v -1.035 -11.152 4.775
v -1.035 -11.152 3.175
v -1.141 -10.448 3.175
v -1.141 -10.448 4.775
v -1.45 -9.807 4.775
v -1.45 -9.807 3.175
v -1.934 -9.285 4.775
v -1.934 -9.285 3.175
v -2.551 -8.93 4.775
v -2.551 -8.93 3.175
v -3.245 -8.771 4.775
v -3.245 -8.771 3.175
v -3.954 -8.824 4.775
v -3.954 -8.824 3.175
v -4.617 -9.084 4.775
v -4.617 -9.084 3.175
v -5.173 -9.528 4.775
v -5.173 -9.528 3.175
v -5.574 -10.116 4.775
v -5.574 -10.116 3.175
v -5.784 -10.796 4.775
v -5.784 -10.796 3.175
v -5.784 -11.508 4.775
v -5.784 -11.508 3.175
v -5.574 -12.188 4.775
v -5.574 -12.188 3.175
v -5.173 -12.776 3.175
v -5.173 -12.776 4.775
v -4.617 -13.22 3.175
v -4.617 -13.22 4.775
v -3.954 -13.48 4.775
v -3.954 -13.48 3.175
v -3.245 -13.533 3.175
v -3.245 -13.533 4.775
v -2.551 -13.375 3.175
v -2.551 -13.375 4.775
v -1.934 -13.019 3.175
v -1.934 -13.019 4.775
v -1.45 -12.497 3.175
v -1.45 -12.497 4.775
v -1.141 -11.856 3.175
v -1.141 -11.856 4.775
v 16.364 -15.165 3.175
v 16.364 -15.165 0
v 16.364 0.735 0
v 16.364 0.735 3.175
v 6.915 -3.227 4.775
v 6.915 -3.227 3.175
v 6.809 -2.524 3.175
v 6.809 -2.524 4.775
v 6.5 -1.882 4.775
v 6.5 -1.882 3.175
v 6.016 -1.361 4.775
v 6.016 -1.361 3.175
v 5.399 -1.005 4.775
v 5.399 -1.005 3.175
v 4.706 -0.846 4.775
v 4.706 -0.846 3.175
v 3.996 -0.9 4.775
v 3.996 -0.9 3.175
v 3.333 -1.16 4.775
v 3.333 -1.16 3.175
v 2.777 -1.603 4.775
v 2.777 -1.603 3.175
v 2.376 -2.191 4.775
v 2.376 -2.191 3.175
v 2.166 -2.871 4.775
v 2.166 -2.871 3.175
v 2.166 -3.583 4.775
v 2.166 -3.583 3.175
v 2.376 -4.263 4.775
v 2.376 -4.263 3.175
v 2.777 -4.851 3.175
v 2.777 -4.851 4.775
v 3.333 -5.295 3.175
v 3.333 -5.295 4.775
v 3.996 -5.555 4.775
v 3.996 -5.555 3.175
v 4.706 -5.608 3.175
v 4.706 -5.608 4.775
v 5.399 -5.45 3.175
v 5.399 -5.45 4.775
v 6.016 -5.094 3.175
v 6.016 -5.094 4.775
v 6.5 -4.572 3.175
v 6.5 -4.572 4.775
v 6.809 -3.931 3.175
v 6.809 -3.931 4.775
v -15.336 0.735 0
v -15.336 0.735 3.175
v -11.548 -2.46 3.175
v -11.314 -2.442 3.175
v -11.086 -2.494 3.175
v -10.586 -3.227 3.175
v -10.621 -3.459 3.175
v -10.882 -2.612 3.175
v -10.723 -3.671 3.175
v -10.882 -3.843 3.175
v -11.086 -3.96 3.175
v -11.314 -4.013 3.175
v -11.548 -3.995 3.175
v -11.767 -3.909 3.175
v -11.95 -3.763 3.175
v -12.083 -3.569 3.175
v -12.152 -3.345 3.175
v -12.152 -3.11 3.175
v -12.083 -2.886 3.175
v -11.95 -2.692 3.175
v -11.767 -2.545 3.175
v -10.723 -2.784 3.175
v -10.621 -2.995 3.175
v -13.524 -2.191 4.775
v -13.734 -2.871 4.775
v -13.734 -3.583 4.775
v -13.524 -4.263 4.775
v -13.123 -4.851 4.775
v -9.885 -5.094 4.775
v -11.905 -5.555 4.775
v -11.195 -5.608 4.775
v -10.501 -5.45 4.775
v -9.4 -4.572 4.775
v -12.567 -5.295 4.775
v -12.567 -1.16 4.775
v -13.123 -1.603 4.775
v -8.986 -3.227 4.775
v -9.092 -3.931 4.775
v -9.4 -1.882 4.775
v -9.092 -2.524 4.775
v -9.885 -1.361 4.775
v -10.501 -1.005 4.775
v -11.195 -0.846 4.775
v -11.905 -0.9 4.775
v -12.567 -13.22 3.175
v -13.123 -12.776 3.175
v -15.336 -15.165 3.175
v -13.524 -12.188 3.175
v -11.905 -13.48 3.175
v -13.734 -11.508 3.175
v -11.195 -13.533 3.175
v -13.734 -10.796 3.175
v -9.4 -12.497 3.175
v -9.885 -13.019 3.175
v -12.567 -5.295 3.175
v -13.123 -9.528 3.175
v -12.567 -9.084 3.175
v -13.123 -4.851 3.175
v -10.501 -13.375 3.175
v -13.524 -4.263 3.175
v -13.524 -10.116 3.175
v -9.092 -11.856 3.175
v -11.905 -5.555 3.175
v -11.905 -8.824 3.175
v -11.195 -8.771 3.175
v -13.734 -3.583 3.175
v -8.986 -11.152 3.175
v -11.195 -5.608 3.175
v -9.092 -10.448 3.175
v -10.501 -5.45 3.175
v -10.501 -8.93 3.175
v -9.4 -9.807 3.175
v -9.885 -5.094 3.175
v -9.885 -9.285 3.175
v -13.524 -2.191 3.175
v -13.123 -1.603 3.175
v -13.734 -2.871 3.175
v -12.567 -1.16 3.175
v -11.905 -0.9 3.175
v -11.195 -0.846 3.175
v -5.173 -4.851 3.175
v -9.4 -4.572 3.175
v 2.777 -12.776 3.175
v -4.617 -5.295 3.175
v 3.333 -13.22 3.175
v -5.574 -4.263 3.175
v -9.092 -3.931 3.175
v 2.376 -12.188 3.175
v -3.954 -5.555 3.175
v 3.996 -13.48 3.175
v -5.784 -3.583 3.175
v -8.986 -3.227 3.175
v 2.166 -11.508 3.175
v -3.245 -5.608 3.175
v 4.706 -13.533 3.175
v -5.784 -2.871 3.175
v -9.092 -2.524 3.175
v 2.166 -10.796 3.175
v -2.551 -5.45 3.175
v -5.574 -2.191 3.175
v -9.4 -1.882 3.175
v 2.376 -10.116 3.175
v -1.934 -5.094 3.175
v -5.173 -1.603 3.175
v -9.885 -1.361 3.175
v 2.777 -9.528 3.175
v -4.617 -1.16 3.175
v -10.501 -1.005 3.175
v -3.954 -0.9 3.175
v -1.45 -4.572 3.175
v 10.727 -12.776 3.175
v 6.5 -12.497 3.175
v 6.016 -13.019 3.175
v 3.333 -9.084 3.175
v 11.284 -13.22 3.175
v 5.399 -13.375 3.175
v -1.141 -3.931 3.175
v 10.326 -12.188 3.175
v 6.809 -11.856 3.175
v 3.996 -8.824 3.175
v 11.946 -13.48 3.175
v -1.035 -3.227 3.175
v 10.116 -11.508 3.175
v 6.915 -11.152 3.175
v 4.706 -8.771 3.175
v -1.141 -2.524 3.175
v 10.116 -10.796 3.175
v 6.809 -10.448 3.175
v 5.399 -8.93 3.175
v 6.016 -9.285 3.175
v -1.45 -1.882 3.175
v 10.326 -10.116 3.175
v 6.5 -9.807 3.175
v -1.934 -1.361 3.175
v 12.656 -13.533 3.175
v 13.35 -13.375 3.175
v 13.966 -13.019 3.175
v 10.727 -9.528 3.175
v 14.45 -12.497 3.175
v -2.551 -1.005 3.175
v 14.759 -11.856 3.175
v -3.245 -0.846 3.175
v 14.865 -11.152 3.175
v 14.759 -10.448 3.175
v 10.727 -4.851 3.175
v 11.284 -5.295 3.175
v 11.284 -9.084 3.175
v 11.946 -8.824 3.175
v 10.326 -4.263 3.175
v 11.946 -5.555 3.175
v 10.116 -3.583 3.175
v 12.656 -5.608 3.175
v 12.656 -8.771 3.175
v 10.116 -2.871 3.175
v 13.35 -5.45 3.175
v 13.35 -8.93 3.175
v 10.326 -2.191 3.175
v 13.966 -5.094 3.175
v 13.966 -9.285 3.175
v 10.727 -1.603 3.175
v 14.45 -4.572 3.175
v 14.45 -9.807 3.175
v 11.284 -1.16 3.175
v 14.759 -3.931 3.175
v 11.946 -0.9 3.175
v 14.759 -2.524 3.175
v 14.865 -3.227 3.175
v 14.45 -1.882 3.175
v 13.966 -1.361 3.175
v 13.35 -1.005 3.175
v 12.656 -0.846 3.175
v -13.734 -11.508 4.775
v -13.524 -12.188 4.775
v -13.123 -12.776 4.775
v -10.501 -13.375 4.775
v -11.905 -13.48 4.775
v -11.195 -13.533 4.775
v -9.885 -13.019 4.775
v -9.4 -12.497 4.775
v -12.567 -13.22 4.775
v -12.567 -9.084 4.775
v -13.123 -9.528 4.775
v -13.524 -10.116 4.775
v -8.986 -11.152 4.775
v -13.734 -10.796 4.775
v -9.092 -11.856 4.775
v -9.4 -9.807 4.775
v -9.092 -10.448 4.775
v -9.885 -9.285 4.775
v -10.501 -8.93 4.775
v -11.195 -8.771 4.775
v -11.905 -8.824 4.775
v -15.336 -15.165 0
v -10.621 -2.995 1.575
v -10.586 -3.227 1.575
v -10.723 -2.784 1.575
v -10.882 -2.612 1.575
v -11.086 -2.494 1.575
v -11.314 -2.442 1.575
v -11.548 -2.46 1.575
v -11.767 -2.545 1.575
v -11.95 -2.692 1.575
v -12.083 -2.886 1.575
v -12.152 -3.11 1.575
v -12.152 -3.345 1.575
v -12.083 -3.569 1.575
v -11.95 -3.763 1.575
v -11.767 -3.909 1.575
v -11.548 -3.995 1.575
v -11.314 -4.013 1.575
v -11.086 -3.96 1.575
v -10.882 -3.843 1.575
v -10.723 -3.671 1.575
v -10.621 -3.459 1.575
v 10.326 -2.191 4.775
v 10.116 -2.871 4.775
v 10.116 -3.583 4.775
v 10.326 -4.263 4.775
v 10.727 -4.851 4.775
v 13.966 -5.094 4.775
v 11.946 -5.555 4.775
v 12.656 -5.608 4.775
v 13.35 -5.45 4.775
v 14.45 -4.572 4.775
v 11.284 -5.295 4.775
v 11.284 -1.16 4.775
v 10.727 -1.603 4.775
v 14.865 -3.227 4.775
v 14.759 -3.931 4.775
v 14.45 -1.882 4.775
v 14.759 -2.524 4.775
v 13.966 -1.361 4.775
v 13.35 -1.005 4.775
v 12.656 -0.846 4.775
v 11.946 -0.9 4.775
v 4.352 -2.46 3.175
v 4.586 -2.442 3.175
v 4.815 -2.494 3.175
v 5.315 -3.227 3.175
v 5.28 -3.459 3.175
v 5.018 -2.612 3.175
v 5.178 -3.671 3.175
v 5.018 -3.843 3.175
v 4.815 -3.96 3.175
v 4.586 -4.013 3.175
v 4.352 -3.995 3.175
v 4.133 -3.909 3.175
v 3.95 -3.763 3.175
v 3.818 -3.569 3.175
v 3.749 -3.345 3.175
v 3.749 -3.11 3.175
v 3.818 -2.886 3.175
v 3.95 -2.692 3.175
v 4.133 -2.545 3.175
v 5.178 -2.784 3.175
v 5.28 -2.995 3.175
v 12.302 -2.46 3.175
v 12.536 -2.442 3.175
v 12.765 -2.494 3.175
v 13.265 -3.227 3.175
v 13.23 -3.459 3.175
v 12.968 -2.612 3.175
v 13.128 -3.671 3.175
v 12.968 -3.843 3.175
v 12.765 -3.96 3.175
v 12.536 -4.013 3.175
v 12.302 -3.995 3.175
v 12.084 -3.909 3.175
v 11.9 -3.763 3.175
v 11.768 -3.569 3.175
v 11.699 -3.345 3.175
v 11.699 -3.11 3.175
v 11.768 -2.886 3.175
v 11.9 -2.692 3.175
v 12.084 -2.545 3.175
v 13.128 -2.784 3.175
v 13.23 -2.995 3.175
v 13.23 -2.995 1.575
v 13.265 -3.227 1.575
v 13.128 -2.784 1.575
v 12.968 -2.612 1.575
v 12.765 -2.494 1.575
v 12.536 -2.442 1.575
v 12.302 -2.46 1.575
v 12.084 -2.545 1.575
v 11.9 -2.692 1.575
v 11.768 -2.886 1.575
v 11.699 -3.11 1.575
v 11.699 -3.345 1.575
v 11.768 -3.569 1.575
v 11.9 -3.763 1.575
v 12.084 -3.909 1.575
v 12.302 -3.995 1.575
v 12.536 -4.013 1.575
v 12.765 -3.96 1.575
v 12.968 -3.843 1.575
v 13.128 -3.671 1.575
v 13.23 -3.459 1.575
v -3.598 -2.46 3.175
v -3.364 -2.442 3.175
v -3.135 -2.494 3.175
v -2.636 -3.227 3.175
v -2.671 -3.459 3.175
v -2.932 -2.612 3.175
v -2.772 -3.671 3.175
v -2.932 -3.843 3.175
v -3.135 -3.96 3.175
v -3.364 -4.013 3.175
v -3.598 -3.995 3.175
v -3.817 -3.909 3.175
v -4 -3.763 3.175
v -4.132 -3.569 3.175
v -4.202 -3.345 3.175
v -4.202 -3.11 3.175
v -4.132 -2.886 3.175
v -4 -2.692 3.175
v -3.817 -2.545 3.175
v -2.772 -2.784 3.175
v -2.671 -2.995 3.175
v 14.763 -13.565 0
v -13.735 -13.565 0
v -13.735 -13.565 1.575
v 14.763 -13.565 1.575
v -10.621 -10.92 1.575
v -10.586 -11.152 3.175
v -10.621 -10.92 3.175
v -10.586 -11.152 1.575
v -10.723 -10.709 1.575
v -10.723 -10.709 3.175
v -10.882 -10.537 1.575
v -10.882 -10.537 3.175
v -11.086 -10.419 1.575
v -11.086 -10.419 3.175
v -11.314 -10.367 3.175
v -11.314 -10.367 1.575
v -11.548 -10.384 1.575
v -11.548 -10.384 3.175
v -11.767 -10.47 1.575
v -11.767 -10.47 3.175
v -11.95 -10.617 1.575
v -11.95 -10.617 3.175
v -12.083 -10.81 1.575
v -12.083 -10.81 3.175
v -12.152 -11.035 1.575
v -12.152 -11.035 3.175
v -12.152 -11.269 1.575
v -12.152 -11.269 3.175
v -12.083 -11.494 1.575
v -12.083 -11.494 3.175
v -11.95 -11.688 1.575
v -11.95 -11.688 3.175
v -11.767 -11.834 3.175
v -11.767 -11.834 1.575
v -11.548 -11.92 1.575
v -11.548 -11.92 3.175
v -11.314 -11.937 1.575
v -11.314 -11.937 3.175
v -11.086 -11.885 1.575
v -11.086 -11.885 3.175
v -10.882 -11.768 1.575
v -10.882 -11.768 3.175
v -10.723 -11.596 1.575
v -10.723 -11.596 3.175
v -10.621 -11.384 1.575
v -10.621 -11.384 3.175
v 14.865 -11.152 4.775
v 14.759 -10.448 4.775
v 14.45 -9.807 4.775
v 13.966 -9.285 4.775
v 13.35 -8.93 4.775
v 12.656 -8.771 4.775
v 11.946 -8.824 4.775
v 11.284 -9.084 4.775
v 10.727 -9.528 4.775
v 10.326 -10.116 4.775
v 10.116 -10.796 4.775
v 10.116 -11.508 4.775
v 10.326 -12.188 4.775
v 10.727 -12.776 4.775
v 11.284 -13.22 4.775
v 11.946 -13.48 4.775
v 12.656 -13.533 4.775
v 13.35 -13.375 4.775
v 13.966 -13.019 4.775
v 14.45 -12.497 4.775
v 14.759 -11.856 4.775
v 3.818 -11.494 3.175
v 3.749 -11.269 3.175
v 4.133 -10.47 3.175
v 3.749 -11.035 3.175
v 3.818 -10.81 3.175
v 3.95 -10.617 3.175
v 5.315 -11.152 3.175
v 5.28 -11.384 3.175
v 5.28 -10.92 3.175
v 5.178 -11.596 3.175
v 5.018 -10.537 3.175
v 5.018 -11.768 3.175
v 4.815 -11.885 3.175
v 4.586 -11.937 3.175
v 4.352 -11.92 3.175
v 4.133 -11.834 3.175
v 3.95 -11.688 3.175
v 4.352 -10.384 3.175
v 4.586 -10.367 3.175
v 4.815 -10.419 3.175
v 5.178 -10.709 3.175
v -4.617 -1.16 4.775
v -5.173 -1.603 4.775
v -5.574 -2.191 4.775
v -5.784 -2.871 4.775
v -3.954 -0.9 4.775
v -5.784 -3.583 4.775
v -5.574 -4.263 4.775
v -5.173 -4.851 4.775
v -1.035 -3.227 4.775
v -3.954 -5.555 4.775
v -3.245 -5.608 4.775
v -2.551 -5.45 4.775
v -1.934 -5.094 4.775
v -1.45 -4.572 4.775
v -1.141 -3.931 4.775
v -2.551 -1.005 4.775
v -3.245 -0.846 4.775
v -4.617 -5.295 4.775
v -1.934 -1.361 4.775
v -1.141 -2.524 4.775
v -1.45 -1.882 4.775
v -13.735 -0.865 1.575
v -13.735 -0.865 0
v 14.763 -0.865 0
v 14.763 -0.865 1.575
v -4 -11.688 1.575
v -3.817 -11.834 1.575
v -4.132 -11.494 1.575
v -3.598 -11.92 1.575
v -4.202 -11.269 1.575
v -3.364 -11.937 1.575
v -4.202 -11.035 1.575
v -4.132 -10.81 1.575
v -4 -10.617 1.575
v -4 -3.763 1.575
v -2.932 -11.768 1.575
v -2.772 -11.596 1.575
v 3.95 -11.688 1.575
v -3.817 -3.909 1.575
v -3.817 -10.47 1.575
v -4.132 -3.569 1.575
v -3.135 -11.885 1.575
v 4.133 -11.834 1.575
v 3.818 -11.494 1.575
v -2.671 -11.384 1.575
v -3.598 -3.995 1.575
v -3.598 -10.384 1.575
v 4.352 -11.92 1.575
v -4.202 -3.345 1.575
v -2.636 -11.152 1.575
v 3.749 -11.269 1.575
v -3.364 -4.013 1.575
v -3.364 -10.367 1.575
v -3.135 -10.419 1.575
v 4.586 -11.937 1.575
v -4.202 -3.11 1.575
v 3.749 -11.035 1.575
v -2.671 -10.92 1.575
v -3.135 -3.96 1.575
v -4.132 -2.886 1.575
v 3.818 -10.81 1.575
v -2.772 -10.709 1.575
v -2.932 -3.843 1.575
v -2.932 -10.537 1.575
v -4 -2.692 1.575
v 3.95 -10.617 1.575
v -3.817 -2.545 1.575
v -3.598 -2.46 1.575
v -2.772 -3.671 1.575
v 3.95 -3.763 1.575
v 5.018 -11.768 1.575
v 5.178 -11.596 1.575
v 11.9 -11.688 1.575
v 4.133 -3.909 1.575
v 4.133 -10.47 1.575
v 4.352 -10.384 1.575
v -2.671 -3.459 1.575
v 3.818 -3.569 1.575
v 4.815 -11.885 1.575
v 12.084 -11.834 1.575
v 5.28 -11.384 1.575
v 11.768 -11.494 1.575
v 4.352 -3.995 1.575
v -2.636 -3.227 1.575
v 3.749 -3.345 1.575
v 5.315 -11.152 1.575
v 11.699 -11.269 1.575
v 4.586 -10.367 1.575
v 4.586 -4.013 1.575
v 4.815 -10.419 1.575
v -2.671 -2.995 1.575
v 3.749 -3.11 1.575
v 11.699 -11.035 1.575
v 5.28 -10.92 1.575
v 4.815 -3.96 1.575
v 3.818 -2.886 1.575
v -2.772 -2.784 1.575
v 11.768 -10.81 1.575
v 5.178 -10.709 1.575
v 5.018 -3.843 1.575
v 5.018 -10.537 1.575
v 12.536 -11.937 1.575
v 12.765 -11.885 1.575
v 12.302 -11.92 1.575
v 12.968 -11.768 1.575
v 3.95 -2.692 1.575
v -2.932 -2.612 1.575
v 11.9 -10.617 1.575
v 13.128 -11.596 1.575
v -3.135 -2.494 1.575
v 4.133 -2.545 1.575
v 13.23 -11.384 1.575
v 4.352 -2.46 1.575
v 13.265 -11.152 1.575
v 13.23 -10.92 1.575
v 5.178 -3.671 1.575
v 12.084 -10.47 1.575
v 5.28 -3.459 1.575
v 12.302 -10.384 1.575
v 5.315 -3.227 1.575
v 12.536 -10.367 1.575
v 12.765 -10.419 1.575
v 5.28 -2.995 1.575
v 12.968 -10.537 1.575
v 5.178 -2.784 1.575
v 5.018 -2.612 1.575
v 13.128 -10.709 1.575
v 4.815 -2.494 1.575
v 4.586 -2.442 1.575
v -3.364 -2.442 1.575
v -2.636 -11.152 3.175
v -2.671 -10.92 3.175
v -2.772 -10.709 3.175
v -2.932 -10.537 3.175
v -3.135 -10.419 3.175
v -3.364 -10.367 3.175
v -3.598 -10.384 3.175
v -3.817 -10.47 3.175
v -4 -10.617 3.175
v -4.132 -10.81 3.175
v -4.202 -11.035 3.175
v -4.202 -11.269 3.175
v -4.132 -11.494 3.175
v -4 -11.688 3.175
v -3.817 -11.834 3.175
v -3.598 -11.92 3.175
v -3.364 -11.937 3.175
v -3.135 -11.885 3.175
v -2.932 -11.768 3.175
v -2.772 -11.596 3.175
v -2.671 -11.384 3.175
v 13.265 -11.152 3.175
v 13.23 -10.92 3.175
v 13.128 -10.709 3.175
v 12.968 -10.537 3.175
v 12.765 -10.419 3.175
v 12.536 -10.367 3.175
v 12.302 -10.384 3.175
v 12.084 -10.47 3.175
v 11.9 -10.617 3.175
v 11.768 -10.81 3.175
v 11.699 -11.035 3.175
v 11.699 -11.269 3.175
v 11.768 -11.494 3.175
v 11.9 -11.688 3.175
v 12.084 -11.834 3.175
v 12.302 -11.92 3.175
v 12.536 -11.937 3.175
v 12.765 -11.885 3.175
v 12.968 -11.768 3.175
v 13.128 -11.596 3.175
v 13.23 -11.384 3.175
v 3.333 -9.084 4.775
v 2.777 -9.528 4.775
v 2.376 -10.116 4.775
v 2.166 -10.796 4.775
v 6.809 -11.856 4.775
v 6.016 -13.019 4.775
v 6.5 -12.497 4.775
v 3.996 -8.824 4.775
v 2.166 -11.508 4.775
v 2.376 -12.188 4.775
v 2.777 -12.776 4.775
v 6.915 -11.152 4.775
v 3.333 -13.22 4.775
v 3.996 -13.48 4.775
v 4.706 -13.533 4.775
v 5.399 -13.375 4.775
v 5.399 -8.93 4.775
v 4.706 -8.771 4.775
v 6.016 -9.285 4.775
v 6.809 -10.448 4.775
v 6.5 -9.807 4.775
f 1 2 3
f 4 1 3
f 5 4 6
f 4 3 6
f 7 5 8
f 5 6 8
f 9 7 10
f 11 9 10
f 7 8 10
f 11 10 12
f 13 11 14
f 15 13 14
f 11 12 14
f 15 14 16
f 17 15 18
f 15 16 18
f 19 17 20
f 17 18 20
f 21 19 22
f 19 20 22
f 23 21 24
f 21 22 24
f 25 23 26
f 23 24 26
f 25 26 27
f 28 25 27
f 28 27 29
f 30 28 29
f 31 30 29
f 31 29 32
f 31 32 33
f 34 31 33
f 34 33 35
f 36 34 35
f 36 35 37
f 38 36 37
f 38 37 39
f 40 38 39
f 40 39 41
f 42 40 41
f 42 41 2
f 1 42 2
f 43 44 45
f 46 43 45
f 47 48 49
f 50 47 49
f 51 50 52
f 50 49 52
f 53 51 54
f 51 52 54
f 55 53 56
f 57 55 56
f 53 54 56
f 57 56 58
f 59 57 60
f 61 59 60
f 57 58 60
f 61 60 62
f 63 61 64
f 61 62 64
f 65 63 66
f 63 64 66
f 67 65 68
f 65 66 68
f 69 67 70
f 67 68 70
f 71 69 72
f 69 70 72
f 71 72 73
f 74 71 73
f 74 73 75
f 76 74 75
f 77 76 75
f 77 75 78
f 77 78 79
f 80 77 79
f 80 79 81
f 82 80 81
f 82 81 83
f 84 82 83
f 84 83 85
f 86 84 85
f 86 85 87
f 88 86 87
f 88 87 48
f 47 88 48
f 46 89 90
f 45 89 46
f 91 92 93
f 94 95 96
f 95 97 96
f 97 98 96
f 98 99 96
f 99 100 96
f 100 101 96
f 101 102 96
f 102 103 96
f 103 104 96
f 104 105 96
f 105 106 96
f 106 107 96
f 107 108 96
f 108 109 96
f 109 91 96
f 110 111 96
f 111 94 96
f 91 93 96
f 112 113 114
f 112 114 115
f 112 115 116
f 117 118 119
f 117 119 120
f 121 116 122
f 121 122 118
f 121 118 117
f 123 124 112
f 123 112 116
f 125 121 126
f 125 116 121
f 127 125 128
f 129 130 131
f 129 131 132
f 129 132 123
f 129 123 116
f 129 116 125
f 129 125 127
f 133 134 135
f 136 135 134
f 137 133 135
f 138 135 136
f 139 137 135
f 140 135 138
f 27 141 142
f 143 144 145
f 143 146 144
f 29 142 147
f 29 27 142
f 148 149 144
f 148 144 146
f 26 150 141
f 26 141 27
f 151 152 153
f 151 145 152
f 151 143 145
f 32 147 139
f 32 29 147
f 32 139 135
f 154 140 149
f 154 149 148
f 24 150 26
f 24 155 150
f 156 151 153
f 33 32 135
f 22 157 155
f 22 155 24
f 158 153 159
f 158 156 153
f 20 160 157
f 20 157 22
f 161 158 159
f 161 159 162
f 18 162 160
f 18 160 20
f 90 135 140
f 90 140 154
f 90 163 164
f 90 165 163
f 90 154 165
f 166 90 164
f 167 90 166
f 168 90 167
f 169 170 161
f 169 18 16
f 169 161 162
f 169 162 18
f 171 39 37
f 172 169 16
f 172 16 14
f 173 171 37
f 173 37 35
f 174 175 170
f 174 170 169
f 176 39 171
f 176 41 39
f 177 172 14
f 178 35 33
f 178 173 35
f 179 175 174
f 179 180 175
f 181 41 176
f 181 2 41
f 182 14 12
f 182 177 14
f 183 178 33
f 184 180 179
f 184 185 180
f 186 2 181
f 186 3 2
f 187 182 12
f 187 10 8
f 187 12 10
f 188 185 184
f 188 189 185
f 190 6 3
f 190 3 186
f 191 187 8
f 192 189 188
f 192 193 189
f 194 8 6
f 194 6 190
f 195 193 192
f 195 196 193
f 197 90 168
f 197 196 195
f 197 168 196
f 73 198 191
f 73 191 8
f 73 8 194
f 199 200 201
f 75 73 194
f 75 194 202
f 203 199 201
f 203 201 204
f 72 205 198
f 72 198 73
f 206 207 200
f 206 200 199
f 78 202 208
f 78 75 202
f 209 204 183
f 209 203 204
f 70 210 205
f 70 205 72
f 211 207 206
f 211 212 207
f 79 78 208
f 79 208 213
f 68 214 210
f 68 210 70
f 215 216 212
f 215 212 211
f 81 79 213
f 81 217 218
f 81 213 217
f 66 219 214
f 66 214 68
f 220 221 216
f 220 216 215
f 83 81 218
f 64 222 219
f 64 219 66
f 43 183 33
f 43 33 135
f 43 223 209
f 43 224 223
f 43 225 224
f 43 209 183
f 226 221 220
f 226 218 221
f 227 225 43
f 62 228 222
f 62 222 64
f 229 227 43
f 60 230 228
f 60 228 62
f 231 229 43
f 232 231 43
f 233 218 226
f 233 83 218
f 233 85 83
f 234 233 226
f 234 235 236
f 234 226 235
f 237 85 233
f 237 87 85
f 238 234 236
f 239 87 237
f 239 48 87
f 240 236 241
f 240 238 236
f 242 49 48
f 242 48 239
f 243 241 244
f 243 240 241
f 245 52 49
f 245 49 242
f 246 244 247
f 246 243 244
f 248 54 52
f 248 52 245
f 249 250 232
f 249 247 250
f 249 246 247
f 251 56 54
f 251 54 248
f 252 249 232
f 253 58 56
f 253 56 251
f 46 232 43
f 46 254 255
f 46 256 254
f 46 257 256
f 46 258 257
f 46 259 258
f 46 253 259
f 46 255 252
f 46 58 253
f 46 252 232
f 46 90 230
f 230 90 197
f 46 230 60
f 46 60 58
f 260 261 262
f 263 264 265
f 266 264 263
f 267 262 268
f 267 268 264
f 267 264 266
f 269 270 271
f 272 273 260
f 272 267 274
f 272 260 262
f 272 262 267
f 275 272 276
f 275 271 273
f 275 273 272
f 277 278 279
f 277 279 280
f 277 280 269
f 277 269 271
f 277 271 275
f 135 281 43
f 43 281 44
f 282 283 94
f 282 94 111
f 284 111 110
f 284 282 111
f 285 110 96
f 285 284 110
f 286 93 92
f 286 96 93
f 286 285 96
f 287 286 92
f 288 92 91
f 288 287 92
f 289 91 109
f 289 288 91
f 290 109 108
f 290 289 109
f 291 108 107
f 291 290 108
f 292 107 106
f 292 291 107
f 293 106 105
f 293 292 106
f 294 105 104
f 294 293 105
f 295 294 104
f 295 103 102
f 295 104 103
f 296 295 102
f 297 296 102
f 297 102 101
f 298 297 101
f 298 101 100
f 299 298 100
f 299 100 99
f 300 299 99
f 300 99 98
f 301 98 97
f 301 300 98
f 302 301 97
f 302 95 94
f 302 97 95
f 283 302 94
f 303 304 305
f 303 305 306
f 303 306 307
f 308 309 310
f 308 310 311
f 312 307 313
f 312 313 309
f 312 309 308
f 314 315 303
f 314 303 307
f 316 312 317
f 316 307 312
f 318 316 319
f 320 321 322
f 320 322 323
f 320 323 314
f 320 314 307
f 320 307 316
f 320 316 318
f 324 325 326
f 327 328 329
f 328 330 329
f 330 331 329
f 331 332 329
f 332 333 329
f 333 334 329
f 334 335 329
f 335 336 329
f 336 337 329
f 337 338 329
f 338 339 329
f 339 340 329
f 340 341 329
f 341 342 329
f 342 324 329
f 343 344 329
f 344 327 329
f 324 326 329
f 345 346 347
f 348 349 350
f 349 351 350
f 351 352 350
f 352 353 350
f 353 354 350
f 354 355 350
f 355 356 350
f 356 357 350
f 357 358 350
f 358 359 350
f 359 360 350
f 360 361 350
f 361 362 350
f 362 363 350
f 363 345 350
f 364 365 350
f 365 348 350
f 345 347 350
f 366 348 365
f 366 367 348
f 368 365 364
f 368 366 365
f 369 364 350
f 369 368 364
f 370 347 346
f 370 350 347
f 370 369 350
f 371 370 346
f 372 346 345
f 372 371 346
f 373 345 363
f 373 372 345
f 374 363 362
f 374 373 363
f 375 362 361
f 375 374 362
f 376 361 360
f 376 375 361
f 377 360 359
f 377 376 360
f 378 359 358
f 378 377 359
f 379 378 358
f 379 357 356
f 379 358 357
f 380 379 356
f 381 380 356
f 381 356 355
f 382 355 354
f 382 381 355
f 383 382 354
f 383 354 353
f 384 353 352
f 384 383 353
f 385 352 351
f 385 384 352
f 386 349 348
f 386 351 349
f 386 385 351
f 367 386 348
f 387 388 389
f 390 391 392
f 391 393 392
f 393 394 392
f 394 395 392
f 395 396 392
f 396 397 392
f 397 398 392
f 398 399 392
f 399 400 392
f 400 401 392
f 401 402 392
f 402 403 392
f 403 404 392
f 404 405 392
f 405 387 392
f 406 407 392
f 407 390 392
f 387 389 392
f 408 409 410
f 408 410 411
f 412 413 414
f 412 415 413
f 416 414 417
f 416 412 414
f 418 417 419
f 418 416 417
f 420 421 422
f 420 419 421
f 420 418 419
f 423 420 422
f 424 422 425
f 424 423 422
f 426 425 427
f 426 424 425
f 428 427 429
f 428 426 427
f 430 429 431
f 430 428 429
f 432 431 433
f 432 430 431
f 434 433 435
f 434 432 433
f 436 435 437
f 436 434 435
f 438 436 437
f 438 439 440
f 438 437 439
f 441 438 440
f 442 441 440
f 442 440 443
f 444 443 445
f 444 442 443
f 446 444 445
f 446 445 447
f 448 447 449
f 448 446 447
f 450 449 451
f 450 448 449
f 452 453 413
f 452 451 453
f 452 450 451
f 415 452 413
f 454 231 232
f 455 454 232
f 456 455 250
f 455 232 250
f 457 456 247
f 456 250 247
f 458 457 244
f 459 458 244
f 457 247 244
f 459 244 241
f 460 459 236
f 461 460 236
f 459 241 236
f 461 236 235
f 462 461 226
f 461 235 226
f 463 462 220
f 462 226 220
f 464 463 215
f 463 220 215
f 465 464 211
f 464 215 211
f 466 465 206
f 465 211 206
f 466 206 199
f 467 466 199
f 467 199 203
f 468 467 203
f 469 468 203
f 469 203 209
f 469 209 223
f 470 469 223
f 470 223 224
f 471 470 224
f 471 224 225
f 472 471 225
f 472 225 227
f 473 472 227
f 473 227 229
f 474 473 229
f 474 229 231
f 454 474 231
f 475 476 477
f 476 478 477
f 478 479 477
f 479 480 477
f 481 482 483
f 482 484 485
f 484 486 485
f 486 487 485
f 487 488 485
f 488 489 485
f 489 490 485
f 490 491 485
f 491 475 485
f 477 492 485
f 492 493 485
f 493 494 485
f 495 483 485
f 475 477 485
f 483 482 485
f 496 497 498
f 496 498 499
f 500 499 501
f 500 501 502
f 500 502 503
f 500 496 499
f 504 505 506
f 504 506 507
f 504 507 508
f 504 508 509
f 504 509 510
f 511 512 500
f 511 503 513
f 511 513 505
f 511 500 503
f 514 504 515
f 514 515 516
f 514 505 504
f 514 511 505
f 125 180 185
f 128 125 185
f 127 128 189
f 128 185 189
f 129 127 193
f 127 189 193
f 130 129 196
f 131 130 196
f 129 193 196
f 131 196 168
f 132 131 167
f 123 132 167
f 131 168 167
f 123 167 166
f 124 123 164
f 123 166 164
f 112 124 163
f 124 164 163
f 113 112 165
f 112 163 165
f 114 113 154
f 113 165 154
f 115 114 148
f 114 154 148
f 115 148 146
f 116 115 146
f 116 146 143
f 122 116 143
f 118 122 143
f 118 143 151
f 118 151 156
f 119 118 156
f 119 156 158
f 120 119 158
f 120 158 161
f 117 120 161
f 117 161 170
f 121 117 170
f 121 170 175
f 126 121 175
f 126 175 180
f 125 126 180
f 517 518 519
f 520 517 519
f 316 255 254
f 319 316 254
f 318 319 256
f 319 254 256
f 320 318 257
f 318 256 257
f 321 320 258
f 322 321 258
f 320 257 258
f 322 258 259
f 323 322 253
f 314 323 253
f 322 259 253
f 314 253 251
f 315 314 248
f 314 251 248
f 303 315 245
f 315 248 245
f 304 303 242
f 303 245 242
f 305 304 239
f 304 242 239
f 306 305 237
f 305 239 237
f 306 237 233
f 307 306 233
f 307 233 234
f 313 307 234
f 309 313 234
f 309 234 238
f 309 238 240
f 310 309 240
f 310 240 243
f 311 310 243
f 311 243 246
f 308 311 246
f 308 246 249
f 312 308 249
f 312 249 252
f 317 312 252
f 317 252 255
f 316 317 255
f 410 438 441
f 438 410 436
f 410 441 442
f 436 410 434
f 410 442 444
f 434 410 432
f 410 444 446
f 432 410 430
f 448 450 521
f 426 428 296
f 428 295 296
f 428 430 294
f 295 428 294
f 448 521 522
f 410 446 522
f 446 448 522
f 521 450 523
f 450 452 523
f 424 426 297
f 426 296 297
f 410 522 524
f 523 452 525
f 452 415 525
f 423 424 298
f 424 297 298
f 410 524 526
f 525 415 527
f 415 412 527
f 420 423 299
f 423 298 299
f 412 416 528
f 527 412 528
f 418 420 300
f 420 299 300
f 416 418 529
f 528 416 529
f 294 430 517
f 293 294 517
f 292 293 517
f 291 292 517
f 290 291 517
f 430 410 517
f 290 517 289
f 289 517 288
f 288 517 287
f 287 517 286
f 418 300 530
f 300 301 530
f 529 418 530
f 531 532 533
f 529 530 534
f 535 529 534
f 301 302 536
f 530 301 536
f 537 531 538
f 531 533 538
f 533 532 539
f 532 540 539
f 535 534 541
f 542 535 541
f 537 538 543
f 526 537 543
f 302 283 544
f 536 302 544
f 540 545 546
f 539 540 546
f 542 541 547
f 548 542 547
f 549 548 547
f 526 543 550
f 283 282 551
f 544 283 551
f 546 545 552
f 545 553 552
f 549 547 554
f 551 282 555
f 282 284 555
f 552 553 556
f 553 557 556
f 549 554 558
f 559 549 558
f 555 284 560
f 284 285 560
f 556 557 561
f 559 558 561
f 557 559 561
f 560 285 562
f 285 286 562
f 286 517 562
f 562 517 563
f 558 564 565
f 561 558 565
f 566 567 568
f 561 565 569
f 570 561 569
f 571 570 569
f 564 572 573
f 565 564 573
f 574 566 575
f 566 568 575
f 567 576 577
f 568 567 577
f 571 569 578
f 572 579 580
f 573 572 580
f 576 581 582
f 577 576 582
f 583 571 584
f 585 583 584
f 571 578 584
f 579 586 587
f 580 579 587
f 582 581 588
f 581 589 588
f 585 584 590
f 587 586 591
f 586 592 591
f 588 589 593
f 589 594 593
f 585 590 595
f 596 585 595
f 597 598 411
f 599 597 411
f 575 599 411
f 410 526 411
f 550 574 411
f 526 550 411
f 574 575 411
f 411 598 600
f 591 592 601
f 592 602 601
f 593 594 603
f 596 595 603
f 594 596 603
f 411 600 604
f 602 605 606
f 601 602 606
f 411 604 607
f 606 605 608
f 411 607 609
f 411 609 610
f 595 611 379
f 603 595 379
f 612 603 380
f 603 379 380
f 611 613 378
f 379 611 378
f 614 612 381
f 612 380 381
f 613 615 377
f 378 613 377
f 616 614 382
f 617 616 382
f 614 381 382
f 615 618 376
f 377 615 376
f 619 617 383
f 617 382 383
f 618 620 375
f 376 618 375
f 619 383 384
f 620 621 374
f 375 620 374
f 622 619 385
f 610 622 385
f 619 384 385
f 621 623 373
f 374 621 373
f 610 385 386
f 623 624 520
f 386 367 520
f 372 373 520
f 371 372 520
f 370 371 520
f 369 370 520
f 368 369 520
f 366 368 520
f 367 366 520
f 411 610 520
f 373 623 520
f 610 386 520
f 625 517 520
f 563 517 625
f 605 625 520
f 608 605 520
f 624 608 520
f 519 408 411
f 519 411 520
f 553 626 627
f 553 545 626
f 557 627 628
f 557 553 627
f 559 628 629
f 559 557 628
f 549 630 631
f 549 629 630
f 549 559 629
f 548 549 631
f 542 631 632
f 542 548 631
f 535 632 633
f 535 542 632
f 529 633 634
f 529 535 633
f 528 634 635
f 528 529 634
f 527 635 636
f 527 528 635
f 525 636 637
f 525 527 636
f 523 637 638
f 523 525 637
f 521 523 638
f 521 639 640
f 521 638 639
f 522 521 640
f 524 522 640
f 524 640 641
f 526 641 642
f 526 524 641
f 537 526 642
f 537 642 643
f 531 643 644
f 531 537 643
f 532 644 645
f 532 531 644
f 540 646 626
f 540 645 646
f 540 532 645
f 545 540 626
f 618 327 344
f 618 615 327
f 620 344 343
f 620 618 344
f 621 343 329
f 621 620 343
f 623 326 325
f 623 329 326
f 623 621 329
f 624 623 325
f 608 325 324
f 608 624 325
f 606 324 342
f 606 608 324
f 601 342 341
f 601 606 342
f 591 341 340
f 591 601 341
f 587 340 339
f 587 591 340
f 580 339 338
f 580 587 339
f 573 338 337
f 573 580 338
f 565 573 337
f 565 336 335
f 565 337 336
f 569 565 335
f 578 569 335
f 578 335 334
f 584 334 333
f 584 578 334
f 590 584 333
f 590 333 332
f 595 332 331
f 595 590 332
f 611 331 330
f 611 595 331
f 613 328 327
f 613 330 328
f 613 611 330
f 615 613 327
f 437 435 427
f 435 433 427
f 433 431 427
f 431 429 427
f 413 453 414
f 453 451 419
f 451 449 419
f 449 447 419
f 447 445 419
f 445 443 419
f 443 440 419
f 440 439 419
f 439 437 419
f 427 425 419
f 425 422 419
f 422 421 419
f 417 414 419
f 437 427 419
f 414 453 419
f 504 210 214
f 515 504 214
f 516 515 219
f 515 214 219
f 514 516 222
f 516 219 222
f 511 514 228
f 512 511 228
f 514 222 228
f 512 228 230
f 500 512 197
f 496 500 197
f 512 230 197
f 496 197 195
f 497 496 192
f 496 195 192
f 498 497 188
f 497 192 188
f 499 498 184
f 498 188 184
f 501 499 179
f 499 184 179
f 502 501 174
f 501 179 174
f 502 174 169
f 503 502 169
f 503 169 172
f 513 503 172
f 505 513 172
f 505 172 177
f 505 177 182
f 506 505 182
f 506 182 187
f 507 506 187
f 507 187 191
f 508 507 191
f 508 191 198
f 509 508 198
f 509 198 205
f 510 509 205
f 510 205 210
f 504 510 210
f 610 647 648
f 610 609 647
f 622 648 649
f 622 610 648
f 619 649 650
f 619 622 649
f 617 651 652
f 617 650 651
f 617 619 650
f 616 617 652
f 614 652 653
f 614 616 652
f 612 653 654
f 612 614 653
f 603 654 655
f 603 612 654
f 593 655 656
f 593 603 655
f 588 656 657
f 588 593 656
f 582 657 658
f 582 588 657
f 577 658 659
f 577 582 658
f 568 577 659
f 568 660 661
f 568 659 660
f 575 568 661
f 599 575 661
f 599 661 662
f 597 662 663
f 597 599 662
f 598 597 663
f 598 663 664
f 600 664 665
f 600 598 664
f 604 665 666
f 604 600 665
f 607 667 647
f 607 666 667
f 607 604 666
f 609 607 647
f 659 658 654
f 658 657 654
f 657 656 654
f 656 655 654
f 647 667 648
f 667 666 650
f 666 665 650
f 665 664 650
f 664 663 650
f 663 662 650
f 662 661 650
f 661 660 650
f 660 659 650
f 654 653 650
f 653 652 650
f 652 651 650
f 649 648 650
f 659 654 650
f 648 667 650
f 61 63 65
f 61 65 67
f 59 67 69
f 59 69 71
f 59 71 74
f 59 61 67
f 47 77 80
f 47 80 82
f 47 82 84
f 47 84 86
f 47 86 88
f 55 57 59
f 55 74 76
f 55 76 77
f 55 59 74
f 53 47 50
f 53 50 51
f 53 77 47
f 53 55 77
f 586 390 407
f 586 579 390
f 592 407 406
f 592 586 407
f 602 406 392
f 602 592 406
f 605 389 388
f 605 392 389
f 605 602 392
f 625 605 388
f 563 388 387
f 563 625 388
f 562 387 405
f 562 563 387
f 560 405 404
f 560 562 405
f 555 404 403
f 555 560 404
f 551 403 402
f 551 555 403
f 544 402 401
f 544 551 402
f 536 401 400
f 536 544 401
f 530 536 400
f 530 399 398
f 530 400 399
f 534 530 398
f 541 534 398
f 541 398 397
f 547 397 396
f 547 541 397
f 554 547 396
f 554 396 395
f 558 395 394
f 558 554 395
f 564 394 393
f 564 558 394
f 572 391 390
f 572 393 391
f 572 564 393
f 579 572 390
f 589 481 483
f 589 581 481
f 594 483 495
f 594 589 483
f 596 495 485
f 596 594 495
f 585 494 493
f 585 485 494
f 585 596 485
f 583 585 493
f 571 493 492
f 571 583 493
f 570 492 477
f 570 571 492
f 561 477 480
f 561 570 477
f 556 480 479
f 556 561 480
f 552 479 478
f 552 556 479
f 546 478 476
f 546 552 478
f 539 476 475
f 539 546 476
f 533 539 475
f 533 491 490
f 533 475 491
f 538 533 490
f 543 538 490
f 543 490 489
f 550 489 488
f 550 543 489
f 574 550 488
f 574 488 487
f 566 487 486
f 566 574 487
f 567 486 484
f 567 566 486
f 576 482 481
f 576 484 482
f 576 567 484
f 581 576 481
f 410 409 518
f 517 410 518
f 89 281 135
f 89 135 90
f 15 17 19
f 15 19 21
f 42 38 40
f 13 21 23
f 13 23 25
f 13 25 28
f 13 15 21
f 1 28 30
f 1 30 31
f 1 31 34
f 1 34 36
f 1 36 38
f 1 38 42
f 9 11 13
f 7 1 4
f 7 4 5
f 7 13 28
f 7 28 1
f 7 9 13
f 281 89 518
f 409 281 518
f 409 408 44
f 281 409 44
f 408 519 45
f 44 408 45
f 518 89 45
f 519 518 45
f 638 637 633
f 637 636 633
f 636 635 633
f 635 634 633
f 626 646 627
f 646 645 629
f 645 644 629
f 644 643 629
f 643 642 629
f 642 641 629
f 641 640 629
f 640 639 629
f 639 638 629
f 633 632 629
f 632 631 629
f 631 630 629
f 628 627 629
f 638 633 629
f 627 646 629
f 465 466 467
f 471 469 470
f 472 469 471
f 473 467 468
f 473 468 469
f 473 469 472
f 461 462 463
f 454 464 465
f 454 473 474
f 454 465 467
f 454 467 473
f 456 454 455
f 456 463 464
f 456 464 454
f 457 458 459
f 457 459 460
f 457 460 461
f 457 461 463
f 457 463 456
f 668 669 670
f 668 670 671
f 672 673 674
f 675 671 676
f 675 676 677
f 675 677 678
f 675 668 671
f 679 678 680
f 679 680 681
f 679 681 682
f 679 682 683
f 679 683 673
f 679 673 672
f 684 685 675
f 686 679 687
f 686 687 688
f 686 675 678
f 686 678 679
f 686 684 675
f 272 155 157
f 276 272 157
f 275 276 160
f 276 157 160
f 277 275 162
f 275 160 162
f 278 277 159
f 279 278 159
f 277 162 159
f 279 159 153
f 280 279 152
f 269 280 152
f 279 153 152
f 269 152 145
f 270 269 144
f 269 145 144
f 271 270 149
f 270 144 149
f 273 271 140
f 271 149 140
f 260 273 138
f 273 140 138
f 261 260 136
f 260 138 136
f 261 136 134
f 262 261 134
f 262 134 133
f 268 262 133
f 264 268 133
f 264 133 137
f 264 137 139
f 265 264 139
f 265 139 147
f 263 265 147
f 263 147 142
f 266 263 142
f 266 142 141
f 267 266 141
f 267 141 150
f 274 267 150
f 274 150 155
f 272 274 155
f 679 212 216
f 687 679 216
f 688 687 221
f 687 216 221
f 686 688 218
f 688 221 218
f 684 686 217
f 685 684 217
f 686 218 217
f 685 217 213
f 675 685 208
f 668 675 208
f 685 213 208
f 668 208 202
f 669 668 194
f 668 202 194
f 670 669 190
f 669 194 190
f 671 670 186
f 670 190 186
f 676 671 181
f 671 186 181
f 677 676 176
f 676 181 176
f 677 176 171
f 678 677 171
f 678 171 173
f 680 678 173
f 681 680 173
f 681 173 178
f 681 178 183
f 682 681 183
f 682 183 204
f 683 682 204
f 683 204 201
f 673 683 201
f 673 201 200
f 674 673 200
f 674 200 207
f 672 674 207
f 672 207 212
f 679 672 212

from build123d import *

# Parameters (mm, degrees)
F0_W     = 31.6992
F0_H     = 15.9004
F0_R     = 2.3876
F1_DEPTH = 3.175
F2_DEPTH = 4.7752
F3_T     = -1.6002


with BuildPart() as f1:
    # F0 (on Top) → F1 (new body)
    with BuildSketch(Plane.XY):
        with Locations((0.5139857531, -7.2151332219)):
            Rectangle(F0_W, F0_H)
        with Locations((-11.3732142469, -11.1521332219)):
            Circle(F0_R, mode=Mode.SUBTRACT)
        with Locations((-3.4230142469, -11.1521332219)):
            Circle(F0_R, mode=Mode.SUBTRACT)
        with Locations((4.5271857531, -11.1521332219)):
            Circle(F0_R, mode=Mode.SUBTRACT)
        with Locations((12.4773857531, -11.1521332219)):
            Circle(F0_R, mode=Mode.SUBTRACT)
        with Locations((-11.3732142469, -3.2273332219)):
            Circle(F0_R, mode=Mode.SUBTRACT)
        with Locations((-3.4230142469, -3.2273332219)):
            Circle(F0_R, mode=Mode.SUBTRACT)
        with Locations((4.5271857531, -3.2273332219)):
            Circle(F0_R, mode=Mode.SUBTRACT)
        with Locations((12.4773857531, -3.2273332219)):
            Circle(F0_R, mode=Mode.SUBTRACT)
    extrude(amount=F1_DEPTH)

    # F0 (on Top) → F2 (join)
    with BuildSketch(Plane.XY):
        with Locations((-11.3732142469, -3.2273332219)):
            Circle(F0_R)
        with Locations((-3.4230142469, -3.2273332219)):
            Circle(F0_R)
        with Locations((4.5271857531, -3.2273332219)):
            Circle(F0_R)
        with Locations((12.4773857531, -3.2273332219)):
            Circle(F0_R)
        with Locations((12.4773857531, -11.1521332219)):
            Circle(F0_R)
        with Locations((4.5271857531, -11.1521332219)):
            Circle(F0_R)
        with Locations((-3.4230142469, -11.1521332219)):
            Circle(F0_R)
        with Locations((-11.3732142469, -11.1521332219)):
            Circle(F0_R)
    extrude(amount=F2_DEPTH)

    # F3
    f3_openings = [f1.faces().sort_by_distance(p)[0] for p in [
        (0.513986, -7.215133, 0),
    ]]
    offset(amount=F3_T, openings=f3_openings, kind=Kind.INTERSECTION)


solid = f1.part
